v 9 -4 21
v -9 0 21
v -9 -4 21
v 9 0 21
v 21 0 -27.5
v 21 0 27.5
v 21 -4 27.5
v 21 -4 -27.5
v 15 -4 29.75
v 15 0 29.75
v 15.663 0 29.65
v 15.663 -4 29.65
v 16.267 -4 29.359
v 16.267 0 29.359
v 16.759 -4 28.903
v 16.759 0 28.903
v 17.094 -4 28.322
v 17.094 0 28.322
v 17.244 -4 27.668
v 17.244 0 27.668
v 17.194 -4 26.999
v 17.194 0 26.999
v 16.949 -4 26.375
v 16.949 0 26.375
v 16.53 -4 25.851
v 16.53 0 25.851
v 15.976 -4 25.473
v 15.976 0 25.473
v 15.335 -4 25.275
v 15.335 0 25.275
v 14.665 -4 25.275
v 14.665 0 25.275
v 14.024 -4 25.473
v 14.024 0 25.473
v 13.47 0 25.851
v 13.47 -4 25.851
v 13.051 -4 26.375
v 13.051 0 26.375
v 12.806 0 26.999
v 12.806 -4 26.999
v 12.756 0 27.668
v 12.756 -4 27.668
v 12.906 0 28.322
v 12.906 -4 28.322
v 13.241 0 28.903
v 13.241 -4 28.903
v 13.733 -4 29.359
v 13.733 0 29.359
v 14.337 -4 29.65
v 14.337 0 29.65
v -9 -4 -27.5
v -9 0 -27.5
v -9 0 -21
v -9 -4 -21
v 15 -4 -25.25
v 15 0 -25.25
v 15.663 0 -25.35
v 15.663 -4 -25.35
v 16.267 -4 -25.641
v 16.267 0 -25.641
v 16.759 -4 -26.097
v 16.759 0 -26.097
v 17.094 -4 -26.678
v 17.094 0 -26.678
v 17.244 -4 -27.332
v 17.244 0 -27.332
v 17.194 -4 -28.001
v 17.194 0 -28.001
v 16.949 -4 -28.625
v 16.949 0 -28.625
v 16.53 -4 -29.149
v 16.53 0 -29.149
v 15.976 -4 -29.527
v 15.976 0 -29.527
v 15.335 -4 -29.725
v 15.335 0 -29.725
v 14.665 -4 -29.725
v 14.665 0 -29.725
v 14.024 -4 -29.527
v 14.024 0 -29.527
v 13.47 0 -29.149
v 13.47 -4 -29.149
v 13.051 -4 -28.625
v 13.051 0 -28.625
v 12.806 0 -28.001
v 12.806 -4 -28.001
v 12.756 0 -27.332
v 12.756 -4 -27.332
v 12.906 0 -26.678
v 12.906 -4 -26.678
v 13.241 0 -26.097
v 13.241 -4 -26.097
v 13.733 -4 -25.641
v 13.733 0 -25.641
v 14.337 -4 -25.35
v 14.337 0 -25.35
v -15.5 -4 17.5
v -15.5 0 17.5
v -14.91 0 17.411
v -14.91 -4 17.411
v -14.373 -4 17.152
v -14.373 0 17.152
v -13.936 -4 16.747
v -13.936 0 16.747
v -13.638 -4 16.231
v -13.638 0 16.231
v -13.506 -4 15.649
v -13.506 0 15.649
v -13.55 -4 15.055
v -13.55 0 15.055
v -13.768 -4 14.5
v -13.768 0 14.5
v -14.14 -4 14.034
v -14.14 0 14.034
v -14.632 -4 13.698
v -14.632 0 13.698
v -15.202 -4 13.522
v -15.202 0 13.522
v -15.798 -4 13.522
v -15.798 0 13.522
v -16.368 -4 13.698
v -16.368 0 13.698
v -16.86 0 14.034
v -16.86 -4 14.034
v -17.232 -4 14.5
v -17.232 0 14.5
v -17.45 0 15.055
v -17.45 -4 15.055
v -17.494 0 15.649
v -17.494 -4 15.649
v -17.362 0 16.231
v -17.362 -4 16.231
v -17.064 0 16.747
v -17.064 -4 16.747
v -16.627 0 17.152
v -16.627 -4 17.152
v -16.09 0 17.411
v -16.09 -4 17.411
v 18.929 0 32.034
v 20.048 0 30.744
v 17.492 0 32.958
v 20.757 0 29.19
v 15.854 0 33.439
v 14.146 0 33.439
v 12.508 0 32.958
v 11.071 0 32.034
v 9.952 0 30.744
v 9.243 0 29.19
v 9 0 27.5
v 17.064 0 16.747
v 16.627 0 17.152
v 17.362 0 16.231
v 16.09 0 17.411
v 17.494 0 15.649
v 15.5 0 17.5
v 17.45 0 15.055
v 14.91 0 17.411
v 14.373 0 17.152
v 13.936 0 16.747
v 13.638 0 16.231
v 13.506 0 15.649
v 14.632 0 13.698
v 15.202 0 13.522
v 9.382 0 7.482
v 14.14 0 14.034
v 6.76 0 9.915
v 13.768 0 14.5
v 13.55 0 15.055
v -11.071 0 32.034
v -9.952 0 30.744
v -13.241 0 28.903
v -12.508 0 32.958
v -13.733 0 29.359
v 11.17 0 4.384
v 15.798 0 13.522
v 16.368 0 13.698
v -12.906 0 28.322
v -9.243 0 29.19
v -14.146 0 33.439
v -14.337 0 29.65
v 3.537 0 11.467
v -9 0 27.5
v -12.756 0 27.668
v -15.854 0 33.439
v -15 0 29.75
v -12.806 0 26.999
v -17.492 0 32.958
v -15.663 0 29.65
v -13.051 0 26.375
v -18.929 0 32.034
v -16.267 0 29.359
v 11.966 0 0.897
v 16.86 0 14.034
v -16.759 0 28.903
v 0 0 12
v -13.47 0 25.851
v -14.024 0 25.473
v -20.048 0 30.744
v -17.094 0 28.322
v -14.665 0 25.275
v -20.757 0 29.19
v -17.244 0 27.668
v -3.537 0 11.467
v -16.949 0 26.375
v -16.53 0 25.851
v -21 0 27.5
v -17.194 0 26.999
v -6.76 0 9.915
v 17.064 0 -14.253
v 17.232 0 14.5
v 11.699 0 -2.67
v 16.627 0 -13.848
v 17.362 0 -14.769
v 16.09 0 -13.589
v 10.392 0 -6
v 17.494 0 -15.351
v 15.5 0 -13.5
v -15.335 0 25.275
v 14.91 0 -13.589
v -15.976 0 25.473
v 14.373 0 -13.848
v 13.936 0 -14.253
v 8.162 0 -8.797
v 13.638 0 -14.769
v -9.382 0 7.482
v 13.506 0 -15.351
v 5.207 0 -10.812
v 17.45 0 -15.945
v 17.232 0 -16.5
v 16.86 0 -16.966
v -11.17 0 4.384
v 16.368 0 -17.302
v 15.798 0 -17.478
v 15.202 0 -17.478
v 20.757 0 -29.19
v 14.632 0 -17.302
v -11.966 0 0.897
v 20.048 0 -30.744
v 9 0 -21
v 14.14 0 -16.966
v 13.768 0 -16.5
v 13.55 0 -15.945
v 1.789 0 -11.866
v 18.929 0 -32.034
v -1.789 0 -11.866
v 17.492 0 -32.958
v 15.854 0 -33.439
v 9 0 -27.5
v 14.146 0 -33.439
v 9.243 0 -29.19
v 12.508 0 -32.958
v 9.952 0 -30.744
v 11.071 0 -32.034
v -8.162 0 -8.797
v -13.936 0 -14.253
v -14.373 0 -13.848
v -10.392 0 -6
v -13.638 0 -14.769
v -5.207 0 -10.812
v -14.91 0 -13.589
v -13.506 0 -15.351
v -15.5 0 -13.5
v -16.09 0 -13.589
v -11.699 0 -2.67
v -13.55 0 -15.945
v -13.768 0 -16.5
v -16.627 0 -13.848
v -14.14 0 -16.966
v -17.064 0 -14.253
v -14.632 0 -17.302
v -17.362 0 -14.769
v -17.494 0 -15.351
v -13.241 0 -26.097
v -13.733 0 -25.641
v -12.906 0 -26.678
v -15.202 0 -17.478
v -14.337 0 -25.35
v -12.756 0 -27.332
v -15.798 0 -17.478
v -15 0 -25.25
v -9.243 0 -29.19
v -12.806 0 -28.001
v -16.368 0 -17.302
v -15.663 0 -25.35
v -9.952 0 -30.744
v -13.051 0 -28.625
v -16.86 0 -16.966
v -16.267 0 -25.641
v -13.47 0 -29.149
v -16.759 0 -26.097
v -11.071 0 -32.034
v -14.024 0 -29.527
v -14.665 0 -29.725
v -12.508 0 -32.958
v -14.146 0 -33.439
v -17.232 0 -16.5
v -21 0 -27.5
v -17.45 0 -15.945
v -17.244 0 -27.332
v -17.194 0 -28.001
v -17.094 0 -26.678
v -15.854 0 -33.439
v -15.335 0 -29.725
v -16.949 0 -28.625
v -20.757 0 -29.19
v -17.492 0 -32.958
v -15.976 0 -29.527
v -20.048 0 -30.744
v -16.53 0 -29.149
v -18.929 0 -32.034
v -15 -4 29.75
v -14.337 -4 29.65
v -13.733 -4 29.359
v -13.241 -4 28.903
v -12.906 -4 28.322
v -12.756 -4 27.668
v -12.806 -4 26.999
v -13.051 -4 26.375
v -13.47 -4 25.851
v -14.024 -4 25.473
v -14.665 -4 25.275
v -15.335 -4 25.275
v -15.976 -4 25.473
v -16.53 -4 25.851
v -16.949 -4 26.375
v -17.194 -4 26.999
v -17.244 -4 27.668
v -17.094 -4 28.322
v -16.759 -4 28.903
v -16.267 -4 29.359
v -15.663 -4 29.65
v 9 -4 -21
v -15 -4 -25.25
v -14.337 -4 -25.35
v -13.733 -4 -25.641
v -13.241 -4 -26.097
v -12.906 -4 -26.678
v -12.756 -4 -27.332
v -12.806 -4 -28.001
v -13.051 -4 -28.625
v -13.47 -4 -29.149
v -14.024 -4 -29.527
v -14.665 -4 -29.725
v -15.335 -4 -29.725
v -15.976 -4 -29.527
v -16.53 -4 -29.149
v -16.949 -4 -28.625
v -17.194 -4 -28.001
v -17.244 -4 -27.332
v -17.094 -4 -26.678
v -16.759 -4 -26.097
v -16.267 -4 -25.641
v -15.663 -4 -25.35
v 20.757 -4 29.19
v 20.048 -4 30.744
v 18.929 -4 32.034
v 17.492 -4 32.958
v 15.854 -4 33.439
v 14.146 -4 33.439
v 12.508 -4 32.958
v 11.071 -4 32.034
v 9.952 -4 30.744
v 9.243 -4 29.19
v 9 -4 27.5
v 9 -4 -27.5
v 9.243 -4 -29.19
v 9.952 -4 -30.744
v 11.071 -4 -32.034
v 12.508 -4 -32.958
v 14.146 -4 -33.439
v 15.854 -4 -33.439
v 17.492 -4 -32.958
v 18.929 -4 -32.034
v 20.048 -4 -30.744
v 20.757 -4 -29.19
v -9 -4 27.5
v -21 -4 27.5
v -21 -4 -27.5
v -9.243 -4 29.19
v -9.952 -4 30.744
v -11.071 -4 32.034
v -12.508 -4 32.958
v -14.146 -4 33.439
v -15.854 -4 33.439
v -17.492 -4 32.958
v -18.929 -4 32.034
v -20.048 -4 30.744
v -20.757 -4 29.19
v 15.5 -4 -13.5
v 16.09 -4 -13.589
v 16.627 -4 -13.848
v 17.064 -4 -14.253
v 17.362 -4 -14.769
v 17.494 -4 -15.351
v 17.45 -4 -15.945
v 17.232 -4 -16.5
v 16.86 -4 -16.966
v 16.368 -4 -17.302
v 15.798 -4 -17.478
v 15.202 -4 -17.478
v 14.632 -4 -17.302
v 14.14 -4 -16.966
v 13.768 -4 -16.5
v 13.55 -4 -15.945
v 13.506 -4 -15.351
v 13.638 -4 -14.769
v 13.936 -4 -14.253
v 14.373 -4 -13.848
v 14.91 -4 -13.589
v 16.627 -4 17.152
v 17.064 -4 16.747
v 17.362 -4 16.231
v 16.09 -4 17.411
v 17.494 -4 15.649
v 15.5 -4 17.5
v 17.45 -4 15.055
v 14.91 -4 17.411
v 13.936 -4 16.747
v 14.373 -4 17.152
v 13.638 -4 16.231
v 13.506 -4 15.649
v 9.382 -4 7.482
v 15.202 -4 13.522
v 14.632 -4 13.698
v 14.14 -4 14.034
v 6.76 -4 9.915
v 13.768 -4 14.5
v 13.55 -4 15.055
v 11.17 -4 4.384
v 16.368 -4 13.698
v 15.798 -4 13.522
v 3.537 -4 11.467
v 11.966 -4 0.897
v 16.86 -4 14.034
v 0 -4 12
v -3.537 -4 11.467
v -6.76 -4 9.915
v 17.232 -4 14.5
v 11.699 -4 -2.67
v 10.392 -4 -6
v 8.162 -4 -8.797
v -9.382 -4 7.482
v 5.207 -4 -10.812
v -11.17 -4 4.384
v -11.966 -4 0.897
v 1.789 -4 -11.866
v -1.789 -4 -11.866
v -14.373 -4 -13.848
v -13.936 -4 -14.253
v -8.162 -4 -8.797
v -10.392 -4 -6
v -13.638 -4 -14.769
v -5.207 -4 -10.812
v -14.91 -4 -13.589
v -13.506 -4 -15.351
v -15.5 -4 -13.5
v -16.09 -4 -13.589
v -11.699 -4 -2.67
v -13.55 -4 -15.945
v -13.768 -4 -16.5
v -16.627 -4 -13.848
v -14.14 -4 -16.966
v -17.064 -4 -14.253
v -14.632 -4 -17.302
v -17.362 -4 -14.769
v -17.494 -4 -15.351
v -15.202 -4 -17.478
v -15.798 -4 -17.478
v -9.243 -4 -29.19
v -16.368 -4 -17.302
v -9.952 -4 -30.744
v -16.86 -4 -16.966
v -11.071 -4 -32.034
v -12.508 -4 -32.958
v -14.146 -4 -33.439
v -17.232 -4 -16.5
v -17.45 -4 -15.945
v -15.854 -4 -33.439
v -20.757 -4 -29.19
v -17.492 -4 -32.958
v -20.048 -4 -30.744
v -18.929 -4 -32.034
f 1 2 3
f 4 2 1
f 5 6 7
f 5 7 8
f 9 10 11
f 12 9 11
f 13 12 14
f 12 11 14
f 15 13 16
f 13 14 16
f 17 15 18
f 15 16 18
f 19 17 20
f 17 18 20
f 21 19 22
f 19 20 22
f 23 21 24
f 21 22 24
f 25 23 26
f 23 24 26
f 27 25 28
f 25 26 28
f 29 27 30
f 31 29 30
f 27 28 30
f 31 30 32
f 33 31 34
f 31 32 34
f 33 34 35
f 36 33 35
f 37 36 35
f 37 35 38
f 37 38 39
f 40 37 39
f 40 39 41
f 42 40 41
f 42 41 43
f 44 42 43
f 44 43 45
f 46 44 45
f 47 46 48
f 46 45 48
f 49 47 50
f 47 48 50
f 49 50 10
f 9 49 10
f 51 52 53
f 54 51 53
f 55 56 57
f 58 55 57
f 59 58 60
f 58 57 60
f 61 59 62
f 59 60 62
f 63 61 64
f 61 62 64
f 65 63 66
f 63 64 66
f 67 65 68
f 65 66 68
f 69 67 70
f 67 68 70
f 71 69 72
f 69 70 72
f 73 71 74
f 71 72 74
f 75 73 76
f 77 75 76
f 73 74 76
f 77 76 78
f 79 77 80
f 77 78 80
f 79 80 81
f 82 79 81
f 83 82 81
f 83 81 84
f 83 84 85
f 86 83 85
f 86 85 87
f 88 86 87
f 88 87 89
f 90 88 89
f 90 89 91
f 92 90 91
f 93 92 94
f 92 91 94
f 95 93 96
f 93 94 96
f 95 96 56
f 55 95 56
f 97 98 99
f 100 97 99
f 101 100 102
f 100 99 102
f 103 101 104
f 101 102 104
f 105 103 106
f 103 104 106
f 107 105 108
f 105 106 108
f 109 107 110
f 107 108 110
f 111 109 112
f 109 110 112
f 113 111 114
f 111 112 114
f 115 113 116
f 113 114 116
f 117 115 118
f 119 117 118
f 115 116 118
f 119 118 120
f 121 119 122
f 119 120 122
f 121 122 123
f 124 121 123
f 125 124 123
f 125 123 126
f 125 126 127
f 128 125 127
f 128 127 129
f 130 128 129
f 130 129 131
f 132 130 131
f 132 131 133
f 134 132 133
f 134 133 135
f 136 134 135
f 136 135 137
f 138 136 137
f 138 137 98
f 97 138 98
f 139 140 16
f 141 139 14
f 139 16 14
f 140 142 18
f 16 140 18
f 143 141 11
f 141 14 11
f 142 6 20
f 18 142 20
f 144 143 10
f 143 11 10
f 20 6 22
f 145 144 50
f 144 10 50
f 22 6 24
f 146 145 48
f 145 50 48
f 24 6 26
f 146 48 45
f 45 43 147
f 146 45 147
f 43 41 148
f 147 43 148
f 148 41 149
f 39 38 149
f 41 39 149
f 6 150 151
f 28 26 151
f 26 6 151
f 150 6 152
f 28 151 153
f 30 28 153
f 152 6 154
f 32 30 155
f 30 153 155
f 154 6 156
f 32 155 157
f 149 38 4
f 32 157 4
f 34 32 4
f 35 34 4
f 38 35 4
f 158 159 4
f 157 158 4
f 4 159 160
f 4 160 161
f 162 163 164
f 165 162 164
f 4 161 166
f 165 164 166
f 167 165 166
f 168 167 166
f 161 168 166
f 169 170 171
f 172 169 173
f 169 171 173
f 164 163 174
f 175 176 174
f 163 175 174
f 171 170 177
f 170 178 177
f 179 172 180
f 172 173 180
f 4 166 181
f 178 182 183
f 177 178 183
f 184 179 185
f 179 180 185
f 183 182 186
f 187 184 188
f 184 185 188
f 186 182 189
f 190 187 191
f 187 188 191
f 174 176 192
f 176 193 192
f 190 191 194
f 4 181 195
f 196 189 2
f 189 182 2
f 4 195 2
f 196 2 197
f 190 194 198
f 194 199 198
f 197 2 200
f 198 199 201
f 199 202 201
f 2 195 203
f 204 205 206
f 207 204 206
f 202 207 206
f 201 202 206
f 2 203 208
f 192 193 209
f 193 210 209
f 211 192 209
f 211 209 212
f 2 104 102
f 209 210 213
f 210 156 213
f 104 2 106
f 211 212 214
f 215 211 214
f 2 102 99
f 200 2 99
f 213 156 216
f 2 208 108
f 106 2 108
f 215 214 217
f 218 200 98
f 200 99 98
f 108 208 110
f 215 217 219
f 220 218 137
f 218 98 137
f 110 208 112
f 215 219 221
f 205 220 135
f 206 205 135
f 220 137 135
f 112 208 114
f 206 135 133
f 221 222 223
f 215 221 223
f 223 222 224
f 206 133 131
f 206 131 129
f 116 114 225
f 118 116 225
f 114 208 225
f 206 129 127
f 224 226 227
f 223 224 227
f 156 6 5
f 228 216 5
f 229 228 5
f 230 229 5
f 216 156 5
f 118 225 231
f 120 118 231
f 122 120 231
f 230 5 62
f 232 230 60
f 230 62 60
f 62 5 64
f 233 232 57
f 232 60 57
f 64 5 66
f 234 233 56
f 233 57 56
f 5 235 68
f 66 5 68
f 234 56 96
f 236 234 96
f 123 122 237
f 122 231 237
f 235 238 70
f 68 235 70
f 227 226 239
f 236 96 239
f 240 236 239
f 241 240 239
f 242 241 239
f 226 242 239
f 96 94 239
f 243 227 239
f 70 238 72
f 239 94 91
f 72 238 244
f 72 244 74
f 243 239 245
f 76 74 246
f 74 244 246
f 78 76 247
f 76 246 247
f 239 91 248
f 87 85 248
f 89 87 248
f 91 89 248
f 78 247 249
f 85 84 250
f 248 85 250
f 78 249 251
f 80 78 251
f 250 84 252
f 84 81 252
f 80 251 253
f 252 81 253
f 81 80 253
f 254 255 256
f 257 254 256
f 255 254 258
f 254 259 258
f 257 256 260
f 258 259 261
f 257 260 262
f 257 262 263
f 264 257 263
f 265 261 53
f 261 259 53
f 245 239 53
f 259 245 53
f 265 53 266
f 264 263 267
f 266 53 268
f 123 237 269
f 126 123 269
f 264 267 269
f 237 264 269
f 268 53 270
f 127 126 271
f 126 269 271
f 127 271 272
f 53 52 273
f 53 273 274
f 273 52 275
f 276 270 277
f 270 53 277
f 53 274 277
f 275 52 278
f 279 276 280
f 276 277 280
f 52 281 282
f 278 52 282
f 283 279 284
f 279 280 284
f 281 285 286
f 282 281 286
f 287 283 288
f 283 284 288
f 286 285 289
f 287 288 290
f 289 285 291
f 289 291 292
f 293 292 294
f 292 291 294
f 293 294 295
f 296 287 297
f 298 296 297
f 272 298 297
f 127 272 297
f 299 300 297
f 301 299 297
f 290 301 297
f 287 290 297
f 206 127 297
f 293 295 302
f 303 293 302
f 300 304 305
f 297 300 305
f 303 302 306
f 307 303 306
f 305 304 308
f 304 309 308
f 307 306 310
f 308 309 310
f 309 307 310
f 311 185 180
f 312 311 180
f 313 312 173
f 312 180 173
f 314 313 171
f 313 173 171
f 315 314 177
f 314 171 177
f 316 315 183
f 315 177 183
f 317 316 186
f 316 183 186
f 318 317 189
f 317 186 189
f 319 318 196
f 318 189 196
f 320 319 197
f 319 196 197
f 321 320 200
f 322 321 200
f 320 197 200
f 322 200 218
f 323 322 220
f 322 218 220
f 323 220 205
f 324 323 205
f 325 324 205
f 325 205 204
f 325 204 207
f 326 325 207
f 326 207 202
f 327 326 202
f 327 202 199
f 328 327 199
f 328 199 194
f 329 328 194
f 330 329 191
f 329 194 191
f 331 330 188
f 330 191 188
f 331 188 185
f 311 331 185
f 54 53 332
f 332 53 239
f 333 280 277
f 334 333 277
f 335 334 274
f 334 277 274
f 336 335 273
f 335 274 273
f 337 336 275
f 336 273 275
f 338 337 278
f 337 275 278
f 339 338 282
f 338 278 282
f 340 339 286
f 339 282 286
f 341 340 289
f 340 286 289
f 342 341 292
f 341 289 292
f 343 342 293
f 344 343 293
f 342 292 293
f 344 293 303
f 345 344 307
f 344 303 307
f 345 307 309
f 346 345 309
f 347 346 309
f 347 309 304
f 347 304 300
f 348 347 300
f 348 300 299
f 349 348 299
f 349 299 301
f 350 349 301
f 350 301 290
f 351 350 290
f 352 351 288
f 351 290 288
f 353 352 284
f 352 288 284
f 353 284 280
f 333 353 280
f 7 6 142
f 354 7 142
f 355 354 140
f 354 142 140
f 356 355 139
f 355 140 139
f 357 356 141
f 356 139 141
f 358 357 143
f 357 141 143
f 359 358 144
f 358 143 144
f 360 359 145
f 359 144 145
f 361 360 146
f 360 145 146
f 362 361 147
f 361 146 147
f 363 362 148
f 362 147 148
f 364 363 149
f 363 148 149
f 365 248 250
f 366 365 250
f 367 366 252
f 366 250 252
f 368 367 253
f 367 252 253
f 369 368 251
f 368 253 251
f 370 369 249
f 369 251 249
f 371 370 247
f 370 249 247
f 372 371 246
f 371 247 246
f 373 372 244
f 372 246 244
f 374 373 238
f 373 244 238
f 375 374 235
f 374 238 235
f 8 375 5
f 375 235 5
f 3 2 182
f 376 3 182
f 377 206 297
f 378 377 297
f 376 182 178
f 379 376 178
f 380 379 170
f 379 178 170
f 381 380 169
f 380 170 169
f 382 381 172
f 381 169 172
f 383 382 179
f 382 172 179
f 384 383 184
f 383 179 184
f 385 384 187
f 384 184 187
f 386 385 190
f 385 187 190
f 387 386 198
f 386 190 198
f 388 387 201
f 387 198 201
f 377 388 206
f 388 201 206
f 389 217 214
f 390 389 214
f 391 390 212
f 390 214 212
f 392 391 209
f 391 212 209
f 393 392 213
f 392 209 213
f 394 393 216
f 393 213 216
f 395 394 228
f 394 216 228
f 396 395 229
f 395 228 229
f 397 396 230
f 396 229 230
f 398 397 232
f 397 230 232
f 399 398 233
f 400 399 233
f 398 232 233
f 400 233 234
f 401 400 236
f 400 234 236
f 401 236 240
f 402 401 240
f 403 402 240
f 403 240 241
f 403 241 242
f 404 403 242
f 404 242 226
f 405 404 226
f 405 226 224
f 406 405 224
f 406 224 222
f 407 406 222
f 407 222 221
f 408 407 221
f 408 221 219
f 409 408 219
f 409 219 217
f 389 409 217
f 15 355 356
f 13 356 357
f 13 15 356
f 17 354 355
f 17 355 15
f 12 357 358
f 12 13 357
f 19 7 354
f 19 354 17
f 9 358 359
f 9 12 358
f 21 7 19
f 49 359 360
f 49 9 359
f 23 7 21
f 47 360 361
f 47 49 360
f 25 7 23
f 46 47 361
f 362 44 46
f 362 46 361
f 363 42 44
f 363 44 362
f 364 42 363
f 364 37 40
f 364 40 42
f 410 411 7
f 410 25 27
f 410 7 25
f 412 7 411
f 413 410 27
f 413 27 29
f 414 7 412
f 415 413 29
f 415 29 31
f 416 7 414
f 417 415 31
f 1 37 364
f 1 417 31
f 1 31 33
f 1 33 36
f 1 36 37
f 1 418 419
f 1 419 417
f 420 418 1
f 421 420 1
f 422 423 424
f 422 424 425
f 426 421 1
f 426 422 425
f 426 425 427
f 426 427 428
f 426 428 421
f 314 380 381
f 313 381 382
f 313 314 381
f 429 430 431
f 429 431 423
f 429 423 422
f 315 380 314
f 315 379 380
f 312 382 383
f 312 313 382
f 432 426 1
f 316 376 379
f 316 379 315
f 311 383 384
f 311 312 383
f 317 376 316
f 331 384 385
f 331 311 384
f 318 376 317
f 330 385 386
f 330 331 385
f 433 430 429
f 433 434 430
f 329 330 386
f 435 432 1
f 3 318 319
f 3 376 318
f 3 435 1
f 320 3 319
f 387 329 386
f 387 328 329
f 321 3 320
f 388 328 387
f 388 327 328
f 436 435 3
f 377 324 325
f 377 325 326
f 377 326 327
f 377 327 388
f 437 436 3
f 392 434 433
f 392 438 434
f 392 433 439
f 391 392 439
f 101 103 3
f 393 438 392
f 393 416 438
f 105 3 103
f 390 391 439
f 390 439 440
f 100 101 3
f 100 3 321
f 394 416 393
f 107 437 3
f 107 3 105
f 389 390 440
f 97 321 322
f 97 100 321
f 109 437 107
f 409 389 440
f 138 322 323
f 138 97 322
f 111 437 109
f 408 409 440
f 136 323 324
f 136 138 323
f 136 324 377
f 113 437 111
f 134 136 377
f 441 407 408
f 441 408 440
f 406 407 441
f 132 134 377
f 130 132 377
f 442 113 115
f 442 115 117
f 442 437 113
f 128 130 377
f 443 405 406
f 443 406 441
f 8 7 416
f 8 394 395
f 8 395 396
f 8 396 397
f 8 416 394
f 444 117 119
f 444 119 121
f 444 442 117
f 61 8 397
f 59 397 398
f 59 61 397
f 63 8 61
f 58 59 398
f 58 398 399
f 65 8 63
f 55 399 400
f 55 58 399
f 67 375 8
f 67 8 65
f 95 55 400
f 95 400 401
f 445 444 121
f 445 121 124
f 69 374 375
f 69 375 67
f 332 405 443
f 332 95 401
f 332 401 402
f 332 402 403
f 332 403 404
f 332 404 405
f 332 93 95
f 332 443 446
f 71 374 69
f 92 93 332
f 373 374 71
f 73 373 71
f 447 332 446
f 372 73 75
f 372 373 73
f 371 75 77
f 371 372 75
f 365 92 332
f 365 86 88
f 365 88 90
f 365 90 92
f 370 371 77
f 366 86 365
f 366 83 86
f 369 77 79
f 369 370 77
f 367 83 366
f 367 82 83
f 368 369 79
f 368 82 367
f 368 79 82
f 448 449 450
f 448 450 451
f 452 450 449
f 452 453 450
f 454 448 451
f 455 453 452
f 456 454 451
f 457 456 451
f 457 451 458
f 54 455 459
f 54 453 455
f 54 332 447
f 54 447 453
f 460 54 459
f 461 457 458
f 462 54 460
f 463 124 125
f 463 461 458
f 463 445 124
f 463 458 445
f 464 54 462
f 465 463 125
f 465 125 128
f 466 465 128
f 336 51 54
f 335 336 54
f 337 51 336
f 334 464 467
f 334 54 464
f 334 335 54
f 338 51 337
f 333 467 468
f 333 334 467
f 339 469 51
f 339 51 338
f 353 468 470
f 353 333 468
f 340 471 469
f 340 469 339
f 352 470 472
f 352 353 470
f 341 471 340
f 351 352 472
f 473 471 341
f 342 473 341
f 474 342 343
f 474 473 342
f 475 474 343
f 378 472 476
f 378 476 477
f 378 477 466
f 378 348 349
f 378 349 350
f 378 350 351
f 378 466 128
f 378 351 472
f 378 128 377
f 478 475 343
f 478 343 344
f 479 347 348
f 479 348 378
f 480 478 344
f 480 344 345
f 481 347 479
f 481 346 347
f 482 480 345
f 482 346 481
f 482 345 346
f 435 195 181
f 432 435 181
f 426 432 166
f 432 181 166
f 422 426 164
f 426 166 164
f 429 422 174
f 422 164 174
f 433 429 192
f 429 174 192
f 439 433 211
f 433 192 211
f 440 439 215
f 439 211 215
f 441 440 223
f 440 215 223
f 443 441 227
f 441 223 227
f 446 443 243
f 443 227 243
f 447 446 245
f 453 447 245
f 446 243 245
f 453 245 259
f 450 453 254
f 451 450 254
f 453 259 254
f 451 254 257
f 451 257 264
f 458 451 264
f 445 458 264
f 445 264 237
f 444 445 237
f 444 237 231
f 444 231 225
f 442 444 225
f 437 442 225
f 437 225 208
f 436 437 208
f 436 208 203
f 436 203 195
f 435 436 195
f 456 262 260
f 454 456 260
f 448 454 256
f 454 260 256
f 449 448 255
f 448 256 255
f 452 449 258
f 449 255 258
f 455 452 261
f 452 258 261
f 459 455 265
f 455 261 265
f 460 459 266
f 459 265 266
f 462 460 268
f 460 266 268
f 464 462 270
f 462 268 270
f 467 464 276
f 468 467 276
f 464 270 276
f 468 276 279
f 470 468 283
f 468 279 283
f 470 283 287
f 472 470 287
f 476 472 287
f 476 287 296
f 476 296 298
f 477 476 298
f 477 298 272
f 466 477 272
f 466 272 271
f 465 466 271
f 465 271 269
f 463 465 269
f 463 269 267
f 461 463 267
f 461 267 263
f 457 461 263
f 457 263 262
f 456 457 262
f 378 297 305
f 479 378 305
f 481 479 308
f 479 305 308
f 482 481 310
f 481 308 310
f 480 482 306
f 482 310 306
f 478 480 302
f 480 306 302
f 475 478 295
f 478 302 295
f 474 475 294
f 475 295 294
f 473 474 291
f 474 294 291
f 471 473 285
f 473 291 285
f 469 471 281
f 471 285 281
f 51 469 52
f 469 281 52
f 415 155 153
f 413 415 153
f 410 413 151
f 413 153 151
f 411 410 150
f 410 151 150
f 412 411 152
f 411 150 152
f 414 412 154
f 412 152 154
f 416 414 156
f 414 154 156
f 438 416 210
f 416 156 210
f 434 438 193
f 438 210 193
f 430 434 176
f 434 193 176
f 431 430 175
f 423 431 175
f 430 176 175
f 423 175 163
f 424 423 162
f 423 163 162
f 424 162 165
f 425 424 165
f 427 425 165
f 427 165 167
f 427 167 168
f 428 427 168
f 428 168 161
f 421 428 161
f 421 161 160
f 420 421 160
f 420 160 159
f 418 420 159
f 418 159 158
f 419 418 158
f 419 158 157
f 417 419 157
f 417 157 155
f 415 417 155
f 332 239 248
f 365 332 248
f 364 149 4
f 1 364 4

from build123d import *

# Parameters (mm, degrees)
SKETCH1_W          = 42
SKETCH1_H          = 42
BASE_FLANGE1_DEPTH = 4
SKETCH4_R          = 2.25
TAB1_DEPTH         = 4
SKETCH5_R          = 12
SKETCH5_R_2        = 2
CUT_EXTRUDE1_DEPTH = 40.73977856


# Sheet-metal steps are written as plain solids
with BuildPart() as part:
    # Sketch1 → Base-Flange1 (new body)
    with BuildSketch(Plane(origin=(0, 0, 0), x_dir=(1, 0, 0), z_dir=(0, 1, 0))):
        Rectangle(SKETCH1_W, SKETCH1_H)
    extrude(amount=-BASE_FLANGE1_DEPTH)

    # Sketch4 → Tab1 (add)
    # profile 1 of 2: a face of its own
    with BuildSketch(Plane(origin=(0, 0, 0), x_dir=(1, 0, 0), z_dir=(0, 1, 0))):
        with BuildLine():
            Line((-9, 27.5), (-9, -27.5))
            ThreePointArc((-9, -27.5), (-15, -33.5), (-21, -27.5))
            Line((-21, -27.5), (-21, 27.5))
            ThreePointArc((-21, 27.5), (-15, 33.5), (-9, 27.5))
        make_face()
        with Locations(Location((-15, 27.5, 0), (0, 0, 270))):
            Circle(SKETCH4_R, mode=Mode.SUBTRACT)
        with Locations(Location((-15, -27.5, 0), (0, 0, 270))):
            Circle(SKETCH4_R, mode=Mode.SUBTRACT)
    # profile 2 of 2: a face of its own
    with BuildSketch(Plane(origin=(0, 0, 0), x_dir=(1, 0, 0), z_dir=(0, 1, 0))):
        with BuildLine():
            Line((21, 27.5), (21, -27.5))
            ThreePointArc((21, -27.5), (15, -33.5), (9, -27.5))
            Line((9, -27.5), (9, 27.5))
            ThreePointArc((9, 27.5), (15, 33.5), (21, 27.5))
        make_face()
        with Locations(Location((15, 27.5, 0), (0, 0, 270))):
            Circle(SKETCH4_R, mode=Mode.SUBTRACT)
        with Locations(Location((15, -27.5, 0), (0, 0, 270))):
            Circle(SKETCH4_R, mode=Mode.SUBTRACT)
    extrude(amount=-TAB1_DEPTH)

    # Sketch5 → Cut-Extrude1 (cut, through all)
    with BuildSketch(Plane(origin=(0, 0, 0), x_dir=(1, 0, 0), z_dir=(0, 1, 0))):
        with Locations(Location((0, 0, 0), (0, 0, 270))):
            Circle(SKETCH5_R)
        with Locations(Location((15.5, 15.5, 0), (0, 0, 270))):
            Circle(SKETCH5_R_2)
        with Locations(Location((15.5, -15.5, 0), (0, 0, 270))):
            Circle(SKETCH5_R_2)
        with Locations(Location((-15.5, -15.5, 0), (0, 0, 270))):
            Circle(SKETCH5_R_2)
        with Locations(Location((-15.5, 15.5, 0), (0, 0, 270))):
            Circle(SKETCH5_R_2)
    extrude(amount=-CUT_EXTRUDE1_DEPTH, mode=Mode.SUBTRACT)


solid = part.part
